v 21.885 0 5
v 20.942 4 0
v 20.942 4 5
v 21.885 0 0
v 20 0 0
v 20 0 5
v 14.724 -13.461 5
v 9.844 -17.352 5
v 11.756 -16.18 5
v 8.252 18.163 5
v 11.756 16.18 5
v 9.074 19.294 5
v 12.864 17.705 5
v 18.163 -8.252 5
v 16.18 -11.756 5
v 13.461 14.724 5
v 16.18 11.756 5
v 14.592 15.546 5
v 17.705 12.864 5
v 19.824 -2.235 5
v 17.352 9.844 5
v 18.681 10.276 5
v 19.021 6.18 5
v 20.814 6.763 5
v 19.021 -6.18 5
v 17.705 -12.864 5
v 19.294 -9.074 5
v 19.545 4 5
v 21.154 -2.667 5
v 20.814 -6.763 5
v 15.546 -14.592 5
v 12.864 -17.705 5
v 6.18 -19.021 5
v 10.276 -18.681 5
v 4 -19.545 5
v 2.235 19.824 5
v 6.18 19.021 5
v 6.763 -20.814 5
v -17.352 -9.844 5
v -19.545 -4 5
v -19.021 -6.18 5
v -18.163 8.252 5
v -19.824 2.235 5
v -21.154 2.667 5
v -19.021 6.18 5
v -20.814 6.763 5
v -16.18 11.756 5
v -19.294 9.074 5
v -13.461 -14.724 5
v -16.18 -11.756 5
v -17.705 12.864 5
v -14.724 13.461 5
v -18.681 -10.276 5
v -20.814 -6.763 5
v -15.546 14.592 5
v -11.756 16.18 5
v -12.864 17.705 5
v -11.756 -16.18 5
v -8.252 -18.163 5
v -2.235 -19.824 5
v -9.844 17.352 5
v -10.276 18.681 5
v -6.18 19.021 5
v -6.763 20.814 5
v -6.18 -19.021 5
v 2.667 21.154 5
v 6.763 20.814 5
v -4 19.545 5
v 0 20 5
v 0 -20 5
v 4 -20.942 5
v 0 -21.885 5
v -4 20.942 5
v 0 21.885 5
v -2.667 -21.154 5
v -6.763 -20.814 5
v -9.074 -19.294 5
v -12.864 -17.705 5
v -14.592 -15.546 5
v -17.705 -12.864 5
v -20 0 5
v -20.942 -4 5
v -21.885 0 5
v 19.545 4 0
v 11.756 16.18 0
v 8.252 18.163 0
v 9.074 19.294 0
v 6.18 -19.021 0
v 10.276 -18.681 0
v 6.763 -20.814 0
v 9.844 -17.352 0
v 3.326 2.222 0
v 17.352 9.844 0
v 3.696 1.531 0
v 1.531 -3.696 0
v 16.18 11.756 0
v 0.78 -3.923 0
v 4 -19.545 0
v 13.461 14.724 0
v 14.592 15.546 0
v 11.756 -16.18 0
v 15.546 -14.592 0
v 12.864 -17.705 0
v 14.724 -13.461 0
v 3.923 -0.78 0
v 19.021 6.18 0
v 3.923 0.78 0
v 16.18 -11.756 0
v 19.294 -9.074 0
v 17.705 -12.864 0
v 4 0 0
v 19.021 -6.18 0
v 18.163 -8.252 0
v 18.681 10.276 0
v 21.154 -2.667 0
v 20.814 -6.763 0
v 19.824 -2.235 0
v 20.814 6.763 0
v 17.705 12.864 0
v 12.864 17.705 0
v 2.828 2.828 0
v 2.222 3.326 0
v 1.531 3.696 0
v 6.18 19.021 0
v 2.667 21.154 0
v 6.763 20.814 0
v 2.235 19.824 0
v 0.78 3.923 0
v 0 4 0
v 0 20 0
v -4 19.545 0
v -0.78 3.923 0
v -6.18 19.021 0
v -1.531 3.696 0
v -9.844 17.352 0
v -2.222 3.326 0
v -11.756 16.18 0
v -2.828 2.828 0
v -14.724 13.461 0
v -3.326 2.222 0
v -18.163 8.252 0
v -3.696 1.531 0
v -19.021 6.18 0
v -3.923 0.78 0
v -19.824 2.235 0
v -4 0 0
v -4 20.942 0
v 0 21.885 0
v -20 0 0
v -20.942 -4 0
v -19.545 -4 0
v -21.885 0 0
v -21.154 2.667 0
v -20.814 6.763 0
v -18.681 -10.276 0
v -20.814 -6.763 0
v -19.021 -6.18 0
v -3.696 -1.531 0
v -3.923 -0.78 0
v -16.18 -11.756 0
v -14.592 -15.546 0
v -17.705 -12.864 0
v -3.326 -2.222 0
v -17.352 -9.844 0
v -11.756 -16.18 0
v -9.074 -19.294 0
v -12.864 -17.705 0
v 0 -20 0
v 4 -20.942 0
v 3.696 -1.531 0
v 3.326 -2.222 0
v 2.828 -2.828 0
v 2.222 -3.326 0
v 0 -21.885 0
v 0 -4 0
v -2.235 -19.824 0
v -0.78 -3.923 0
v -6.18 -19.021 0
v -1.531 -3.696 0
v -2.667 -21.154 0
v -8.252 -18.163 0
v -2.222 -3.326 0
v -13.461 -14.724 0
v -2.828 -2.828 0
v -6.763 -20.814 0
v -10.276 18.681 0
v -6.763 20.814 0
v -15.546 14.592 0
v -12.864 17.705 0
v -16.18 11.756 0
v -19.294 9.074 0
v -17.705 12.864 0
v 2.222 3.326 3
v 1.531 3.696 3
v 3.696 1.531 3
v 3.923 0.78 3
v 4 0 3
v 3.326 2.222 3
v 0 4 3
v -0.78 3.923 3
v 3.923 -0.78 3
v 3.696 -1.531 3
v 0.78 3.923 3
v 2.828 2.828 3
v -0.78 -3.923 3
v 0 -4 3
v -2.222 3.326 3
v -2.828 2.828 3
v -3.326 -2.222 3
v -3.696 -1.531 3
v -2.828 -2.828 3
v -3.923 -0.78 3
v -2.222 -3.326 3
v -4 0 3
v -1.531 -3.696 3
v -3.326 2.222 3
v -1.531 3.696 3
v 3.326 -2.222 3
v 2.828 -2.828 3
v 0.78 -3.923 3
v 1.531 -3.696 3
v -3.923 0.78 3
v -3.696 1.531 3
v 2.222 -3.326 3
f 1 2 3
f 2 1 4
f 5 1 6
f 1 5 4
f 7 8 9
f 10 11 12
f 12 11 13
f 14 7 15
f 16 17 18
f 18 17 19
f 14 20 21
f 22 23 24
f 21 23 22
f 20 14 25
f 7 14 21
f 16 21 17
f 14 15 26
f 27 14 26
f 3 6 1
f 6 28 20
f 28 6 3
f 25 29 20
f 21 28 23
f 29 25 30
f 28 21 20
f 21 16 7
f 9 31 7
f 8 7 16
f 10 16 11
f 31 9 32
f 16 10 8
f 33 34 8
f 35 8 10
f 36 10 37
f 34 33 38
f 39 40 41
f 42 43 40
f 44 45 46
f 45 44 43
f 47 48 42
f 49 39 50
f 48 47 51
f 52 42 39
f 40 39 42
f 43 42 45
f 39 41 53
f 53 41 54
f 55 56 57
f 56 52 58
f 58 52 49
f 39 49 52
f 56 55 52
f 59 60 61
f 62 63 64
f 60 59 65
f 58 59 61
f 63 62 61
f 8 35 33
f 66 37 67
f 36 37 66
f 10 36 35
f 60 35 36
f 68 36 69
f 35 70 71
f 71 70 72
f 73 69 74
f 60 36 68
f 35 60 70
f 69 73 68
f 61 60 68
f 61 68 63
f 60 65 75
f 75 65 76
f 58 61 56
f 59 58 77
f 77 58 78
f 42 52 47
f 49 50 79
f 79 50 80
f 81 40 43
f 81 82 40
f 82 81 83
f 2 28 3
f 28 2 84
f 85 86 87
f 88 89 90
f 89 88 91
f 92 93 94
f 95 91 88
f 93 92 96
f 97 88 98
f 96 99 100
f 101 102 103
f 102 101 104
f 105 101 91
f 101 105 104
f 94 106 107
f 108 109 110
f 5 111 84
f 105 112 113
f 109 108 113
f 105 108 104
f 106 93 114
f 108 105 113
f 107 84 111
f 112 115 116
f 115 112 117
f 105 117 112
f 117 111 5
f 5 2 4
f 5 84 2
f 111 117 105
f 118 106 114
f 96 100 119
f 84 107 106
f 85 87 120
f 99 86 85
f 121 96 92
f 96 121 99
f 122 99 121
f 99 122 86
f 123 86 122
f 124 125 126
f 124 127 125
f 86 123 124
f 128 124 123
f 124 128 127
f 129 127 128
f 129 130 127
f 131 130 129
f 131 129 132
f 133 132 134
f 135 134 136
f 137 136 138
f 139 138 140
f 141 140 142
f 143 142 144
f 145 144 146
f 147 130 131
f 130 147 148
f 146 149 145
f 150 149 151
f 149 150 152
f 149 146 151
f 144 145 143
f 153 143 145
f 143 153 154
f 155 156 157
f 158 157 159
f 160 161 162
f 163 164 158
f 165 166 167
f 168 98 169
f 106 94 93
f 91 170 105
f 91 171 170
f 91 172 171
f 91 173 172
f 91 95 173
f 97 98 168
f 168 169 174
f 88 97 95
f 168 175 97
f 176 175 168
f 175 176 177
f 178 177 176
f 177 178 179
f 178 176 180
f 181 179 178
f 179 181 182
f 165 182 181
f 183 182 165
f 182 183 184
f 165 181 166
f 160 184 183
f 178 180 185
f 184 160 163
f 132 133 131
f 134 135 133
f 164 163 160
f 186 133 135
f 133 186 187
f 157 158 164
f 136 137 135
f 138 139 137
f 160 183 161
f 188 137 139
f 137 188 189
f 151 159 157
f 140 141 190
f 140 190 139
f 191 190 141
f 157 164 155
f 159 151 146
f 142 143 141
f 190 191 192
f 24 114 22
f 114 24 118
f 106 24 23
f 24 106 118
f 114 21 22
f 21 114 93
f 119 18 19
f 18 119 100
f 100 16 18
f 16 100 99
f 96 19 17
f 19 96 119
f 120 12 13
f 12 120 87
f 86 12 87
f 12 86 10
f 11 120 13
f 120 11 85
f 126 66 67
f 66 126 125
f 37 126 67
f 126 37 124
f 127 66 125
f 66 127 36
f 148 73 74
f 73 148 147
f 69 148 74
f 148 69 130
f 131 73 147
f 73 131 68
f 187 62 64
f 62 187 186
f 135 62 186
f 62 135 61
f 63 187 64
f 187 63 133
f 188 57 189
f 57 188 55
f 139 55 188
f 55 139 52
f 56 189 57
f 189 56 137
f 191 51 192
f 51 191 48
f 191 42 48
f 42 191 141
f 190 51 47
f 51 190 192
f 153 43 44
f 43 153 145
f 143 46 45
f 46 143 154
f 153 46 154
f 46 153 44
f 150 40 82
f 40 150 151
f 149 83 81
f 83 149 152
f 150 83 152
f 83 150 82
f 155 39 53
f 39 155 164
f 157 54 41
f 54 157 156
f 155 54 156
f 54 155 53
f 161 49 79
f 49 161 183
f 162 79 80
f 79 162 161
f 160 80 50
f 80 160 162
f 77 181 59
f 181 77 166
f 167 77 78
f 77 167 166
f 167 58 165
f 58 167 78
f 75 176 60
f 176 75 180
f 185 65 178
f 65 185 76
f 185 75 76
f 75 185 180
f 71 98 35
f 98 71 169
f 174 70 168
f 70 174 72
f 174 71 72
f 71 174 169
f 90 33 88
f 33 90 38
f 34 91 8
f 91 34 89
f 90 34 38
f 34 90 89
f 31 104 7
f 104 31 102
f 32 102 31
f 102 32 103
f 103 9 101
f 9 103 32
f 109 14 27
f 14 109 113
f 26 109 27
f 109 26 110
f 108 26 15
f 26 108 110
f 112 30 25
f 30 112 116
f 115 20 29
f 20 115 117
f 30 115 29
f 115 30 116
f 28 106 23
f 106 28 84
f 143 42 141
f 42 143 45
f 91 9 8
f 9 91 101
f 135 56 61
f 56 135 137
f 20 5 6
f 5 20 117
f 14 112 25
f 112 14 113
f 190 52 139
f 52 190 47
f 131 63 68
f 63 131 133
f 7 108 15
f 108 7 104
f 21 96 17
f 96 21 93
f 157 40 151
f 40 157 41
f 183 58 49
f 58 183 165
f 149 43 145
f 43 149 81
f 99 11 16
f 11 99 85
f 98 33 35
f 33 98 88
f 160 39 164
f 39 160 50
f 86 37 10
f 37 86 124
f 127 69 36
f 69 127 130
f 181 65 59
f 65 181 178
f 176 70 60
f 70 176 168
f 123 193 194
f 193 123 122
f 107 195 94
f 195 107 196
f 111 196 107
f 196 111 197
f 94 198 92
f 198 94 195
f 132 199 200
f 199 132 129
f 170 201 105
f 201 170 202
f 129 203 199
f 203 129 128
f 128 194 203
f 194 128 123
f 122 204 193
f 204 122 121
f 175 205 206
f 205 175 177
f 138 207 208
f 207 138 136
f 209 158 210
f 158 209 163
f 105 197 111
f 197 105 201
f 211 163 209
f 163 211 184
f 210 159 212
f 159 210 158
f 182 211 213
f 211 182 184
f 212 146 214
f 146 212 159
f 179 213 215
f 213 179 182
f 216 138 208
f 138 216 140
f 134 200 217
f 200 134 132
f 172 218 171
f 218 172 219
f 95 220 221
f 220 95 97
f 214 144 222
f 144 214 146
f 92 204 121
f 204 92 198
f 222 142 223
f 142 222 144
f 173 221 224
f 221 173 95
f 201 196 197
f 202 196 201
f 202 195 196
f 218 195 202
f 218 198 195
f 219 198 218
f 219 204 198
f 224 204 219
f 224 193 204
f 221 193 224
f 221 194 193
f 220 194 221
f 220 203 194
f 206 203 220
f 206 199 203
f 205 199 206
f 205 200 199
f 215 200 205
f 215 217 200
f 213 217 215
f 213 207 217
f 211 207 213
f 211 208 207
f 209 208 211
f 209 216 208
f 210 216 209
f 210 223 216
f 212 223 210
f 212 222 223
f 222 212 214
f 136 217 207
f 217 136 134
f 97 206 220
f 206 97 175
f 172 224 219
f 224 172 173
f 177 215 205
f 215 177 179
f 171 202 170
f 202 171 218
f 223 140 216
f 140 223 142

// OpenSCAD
// Mechanical: Gear
// Simple spur gear

module gear(teeth=20, radius=20, thickness=5, pressure_angle=20) {
    tooth_height = radius * 0.2;
    tooth_width = (2 * PI * radius / teeth) * 0.6;

    difference() {
        union() {
            cylinder(r=radius, h=thickness, $fn=teeth*2);
            for (i = [0:teeth-1]) {
                rotate([0, 0, i * 360/teeth])
                translate([radius, 0, 0])
                    linear_extrude(thickness)
                        polygon([
                            [-tooth_width/2, 0],
                            [-tooth_width/4, tooth_height],
                            [ tooth_width/4, tooth_height],
                            [ tooth_width/2, 0]
                        ]);
            }
        }
        // Center hole
        cylinder(r=radius*0.2, h=thickness+1, center=true, $fn=32);
    }
}

gear(teeth=20, radius=20, thickness=5);
